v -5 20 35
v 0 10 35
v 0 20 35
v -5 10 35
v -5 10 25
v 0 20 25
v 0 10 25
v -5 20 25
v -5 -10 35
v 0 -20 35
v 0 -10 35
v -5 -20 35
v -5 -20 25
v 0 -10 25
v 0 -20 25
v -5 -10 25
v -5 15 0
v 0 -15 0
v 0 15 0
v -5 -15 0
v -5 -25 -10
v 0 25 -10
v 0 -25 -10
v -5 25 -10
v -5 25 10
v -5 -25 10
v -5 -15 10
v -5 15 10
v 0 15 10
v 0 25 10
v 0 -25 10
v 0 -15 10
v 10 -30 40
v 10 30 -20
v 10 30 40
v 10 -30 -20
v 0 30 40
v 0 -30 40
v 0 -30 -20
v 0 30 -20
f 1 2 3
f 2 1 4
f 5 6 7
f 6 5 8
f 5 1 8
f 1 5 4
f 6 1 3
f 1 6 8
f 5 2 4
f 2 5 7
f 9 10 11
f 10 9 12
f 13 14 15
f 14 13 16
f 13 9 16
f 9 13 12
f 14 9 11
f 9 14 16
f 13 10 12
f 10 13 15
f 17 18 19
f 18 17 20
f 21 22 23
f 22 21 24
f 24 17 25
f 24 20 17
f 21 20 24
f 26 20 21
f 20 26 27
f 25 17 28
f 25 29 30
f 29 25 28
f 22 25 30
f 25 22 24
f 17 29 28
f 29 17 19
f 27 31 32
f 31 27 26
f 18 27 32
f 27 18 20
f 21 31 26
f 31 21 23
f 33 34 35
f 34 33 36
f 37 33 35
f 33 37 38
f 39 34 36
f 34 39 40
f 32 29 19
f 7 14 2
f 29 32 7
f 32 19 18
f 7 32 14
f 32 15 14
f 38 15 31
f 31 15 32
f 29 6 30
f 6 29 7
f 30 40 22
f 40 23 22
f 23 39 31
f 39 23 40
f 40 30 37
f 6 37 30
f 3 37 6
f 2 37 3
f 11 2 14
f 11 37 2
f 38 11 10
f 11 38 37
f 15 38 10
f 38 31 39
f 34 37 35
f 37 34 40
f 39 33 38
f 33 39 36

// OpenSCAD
translate([0,15,30])
    cube([10,10,10],true);

translate([0,-15,30])
    cube([10,10,10],true);

translate([0,0,-5])
    cube([10,40,10],true);

translate([0,20,0],true)
    cube([10,10,20],true);

translate([0,-20,0],true)
    cube([10,10,20],true);

translate([5,0,10])
    cube([10,60,60],true);
